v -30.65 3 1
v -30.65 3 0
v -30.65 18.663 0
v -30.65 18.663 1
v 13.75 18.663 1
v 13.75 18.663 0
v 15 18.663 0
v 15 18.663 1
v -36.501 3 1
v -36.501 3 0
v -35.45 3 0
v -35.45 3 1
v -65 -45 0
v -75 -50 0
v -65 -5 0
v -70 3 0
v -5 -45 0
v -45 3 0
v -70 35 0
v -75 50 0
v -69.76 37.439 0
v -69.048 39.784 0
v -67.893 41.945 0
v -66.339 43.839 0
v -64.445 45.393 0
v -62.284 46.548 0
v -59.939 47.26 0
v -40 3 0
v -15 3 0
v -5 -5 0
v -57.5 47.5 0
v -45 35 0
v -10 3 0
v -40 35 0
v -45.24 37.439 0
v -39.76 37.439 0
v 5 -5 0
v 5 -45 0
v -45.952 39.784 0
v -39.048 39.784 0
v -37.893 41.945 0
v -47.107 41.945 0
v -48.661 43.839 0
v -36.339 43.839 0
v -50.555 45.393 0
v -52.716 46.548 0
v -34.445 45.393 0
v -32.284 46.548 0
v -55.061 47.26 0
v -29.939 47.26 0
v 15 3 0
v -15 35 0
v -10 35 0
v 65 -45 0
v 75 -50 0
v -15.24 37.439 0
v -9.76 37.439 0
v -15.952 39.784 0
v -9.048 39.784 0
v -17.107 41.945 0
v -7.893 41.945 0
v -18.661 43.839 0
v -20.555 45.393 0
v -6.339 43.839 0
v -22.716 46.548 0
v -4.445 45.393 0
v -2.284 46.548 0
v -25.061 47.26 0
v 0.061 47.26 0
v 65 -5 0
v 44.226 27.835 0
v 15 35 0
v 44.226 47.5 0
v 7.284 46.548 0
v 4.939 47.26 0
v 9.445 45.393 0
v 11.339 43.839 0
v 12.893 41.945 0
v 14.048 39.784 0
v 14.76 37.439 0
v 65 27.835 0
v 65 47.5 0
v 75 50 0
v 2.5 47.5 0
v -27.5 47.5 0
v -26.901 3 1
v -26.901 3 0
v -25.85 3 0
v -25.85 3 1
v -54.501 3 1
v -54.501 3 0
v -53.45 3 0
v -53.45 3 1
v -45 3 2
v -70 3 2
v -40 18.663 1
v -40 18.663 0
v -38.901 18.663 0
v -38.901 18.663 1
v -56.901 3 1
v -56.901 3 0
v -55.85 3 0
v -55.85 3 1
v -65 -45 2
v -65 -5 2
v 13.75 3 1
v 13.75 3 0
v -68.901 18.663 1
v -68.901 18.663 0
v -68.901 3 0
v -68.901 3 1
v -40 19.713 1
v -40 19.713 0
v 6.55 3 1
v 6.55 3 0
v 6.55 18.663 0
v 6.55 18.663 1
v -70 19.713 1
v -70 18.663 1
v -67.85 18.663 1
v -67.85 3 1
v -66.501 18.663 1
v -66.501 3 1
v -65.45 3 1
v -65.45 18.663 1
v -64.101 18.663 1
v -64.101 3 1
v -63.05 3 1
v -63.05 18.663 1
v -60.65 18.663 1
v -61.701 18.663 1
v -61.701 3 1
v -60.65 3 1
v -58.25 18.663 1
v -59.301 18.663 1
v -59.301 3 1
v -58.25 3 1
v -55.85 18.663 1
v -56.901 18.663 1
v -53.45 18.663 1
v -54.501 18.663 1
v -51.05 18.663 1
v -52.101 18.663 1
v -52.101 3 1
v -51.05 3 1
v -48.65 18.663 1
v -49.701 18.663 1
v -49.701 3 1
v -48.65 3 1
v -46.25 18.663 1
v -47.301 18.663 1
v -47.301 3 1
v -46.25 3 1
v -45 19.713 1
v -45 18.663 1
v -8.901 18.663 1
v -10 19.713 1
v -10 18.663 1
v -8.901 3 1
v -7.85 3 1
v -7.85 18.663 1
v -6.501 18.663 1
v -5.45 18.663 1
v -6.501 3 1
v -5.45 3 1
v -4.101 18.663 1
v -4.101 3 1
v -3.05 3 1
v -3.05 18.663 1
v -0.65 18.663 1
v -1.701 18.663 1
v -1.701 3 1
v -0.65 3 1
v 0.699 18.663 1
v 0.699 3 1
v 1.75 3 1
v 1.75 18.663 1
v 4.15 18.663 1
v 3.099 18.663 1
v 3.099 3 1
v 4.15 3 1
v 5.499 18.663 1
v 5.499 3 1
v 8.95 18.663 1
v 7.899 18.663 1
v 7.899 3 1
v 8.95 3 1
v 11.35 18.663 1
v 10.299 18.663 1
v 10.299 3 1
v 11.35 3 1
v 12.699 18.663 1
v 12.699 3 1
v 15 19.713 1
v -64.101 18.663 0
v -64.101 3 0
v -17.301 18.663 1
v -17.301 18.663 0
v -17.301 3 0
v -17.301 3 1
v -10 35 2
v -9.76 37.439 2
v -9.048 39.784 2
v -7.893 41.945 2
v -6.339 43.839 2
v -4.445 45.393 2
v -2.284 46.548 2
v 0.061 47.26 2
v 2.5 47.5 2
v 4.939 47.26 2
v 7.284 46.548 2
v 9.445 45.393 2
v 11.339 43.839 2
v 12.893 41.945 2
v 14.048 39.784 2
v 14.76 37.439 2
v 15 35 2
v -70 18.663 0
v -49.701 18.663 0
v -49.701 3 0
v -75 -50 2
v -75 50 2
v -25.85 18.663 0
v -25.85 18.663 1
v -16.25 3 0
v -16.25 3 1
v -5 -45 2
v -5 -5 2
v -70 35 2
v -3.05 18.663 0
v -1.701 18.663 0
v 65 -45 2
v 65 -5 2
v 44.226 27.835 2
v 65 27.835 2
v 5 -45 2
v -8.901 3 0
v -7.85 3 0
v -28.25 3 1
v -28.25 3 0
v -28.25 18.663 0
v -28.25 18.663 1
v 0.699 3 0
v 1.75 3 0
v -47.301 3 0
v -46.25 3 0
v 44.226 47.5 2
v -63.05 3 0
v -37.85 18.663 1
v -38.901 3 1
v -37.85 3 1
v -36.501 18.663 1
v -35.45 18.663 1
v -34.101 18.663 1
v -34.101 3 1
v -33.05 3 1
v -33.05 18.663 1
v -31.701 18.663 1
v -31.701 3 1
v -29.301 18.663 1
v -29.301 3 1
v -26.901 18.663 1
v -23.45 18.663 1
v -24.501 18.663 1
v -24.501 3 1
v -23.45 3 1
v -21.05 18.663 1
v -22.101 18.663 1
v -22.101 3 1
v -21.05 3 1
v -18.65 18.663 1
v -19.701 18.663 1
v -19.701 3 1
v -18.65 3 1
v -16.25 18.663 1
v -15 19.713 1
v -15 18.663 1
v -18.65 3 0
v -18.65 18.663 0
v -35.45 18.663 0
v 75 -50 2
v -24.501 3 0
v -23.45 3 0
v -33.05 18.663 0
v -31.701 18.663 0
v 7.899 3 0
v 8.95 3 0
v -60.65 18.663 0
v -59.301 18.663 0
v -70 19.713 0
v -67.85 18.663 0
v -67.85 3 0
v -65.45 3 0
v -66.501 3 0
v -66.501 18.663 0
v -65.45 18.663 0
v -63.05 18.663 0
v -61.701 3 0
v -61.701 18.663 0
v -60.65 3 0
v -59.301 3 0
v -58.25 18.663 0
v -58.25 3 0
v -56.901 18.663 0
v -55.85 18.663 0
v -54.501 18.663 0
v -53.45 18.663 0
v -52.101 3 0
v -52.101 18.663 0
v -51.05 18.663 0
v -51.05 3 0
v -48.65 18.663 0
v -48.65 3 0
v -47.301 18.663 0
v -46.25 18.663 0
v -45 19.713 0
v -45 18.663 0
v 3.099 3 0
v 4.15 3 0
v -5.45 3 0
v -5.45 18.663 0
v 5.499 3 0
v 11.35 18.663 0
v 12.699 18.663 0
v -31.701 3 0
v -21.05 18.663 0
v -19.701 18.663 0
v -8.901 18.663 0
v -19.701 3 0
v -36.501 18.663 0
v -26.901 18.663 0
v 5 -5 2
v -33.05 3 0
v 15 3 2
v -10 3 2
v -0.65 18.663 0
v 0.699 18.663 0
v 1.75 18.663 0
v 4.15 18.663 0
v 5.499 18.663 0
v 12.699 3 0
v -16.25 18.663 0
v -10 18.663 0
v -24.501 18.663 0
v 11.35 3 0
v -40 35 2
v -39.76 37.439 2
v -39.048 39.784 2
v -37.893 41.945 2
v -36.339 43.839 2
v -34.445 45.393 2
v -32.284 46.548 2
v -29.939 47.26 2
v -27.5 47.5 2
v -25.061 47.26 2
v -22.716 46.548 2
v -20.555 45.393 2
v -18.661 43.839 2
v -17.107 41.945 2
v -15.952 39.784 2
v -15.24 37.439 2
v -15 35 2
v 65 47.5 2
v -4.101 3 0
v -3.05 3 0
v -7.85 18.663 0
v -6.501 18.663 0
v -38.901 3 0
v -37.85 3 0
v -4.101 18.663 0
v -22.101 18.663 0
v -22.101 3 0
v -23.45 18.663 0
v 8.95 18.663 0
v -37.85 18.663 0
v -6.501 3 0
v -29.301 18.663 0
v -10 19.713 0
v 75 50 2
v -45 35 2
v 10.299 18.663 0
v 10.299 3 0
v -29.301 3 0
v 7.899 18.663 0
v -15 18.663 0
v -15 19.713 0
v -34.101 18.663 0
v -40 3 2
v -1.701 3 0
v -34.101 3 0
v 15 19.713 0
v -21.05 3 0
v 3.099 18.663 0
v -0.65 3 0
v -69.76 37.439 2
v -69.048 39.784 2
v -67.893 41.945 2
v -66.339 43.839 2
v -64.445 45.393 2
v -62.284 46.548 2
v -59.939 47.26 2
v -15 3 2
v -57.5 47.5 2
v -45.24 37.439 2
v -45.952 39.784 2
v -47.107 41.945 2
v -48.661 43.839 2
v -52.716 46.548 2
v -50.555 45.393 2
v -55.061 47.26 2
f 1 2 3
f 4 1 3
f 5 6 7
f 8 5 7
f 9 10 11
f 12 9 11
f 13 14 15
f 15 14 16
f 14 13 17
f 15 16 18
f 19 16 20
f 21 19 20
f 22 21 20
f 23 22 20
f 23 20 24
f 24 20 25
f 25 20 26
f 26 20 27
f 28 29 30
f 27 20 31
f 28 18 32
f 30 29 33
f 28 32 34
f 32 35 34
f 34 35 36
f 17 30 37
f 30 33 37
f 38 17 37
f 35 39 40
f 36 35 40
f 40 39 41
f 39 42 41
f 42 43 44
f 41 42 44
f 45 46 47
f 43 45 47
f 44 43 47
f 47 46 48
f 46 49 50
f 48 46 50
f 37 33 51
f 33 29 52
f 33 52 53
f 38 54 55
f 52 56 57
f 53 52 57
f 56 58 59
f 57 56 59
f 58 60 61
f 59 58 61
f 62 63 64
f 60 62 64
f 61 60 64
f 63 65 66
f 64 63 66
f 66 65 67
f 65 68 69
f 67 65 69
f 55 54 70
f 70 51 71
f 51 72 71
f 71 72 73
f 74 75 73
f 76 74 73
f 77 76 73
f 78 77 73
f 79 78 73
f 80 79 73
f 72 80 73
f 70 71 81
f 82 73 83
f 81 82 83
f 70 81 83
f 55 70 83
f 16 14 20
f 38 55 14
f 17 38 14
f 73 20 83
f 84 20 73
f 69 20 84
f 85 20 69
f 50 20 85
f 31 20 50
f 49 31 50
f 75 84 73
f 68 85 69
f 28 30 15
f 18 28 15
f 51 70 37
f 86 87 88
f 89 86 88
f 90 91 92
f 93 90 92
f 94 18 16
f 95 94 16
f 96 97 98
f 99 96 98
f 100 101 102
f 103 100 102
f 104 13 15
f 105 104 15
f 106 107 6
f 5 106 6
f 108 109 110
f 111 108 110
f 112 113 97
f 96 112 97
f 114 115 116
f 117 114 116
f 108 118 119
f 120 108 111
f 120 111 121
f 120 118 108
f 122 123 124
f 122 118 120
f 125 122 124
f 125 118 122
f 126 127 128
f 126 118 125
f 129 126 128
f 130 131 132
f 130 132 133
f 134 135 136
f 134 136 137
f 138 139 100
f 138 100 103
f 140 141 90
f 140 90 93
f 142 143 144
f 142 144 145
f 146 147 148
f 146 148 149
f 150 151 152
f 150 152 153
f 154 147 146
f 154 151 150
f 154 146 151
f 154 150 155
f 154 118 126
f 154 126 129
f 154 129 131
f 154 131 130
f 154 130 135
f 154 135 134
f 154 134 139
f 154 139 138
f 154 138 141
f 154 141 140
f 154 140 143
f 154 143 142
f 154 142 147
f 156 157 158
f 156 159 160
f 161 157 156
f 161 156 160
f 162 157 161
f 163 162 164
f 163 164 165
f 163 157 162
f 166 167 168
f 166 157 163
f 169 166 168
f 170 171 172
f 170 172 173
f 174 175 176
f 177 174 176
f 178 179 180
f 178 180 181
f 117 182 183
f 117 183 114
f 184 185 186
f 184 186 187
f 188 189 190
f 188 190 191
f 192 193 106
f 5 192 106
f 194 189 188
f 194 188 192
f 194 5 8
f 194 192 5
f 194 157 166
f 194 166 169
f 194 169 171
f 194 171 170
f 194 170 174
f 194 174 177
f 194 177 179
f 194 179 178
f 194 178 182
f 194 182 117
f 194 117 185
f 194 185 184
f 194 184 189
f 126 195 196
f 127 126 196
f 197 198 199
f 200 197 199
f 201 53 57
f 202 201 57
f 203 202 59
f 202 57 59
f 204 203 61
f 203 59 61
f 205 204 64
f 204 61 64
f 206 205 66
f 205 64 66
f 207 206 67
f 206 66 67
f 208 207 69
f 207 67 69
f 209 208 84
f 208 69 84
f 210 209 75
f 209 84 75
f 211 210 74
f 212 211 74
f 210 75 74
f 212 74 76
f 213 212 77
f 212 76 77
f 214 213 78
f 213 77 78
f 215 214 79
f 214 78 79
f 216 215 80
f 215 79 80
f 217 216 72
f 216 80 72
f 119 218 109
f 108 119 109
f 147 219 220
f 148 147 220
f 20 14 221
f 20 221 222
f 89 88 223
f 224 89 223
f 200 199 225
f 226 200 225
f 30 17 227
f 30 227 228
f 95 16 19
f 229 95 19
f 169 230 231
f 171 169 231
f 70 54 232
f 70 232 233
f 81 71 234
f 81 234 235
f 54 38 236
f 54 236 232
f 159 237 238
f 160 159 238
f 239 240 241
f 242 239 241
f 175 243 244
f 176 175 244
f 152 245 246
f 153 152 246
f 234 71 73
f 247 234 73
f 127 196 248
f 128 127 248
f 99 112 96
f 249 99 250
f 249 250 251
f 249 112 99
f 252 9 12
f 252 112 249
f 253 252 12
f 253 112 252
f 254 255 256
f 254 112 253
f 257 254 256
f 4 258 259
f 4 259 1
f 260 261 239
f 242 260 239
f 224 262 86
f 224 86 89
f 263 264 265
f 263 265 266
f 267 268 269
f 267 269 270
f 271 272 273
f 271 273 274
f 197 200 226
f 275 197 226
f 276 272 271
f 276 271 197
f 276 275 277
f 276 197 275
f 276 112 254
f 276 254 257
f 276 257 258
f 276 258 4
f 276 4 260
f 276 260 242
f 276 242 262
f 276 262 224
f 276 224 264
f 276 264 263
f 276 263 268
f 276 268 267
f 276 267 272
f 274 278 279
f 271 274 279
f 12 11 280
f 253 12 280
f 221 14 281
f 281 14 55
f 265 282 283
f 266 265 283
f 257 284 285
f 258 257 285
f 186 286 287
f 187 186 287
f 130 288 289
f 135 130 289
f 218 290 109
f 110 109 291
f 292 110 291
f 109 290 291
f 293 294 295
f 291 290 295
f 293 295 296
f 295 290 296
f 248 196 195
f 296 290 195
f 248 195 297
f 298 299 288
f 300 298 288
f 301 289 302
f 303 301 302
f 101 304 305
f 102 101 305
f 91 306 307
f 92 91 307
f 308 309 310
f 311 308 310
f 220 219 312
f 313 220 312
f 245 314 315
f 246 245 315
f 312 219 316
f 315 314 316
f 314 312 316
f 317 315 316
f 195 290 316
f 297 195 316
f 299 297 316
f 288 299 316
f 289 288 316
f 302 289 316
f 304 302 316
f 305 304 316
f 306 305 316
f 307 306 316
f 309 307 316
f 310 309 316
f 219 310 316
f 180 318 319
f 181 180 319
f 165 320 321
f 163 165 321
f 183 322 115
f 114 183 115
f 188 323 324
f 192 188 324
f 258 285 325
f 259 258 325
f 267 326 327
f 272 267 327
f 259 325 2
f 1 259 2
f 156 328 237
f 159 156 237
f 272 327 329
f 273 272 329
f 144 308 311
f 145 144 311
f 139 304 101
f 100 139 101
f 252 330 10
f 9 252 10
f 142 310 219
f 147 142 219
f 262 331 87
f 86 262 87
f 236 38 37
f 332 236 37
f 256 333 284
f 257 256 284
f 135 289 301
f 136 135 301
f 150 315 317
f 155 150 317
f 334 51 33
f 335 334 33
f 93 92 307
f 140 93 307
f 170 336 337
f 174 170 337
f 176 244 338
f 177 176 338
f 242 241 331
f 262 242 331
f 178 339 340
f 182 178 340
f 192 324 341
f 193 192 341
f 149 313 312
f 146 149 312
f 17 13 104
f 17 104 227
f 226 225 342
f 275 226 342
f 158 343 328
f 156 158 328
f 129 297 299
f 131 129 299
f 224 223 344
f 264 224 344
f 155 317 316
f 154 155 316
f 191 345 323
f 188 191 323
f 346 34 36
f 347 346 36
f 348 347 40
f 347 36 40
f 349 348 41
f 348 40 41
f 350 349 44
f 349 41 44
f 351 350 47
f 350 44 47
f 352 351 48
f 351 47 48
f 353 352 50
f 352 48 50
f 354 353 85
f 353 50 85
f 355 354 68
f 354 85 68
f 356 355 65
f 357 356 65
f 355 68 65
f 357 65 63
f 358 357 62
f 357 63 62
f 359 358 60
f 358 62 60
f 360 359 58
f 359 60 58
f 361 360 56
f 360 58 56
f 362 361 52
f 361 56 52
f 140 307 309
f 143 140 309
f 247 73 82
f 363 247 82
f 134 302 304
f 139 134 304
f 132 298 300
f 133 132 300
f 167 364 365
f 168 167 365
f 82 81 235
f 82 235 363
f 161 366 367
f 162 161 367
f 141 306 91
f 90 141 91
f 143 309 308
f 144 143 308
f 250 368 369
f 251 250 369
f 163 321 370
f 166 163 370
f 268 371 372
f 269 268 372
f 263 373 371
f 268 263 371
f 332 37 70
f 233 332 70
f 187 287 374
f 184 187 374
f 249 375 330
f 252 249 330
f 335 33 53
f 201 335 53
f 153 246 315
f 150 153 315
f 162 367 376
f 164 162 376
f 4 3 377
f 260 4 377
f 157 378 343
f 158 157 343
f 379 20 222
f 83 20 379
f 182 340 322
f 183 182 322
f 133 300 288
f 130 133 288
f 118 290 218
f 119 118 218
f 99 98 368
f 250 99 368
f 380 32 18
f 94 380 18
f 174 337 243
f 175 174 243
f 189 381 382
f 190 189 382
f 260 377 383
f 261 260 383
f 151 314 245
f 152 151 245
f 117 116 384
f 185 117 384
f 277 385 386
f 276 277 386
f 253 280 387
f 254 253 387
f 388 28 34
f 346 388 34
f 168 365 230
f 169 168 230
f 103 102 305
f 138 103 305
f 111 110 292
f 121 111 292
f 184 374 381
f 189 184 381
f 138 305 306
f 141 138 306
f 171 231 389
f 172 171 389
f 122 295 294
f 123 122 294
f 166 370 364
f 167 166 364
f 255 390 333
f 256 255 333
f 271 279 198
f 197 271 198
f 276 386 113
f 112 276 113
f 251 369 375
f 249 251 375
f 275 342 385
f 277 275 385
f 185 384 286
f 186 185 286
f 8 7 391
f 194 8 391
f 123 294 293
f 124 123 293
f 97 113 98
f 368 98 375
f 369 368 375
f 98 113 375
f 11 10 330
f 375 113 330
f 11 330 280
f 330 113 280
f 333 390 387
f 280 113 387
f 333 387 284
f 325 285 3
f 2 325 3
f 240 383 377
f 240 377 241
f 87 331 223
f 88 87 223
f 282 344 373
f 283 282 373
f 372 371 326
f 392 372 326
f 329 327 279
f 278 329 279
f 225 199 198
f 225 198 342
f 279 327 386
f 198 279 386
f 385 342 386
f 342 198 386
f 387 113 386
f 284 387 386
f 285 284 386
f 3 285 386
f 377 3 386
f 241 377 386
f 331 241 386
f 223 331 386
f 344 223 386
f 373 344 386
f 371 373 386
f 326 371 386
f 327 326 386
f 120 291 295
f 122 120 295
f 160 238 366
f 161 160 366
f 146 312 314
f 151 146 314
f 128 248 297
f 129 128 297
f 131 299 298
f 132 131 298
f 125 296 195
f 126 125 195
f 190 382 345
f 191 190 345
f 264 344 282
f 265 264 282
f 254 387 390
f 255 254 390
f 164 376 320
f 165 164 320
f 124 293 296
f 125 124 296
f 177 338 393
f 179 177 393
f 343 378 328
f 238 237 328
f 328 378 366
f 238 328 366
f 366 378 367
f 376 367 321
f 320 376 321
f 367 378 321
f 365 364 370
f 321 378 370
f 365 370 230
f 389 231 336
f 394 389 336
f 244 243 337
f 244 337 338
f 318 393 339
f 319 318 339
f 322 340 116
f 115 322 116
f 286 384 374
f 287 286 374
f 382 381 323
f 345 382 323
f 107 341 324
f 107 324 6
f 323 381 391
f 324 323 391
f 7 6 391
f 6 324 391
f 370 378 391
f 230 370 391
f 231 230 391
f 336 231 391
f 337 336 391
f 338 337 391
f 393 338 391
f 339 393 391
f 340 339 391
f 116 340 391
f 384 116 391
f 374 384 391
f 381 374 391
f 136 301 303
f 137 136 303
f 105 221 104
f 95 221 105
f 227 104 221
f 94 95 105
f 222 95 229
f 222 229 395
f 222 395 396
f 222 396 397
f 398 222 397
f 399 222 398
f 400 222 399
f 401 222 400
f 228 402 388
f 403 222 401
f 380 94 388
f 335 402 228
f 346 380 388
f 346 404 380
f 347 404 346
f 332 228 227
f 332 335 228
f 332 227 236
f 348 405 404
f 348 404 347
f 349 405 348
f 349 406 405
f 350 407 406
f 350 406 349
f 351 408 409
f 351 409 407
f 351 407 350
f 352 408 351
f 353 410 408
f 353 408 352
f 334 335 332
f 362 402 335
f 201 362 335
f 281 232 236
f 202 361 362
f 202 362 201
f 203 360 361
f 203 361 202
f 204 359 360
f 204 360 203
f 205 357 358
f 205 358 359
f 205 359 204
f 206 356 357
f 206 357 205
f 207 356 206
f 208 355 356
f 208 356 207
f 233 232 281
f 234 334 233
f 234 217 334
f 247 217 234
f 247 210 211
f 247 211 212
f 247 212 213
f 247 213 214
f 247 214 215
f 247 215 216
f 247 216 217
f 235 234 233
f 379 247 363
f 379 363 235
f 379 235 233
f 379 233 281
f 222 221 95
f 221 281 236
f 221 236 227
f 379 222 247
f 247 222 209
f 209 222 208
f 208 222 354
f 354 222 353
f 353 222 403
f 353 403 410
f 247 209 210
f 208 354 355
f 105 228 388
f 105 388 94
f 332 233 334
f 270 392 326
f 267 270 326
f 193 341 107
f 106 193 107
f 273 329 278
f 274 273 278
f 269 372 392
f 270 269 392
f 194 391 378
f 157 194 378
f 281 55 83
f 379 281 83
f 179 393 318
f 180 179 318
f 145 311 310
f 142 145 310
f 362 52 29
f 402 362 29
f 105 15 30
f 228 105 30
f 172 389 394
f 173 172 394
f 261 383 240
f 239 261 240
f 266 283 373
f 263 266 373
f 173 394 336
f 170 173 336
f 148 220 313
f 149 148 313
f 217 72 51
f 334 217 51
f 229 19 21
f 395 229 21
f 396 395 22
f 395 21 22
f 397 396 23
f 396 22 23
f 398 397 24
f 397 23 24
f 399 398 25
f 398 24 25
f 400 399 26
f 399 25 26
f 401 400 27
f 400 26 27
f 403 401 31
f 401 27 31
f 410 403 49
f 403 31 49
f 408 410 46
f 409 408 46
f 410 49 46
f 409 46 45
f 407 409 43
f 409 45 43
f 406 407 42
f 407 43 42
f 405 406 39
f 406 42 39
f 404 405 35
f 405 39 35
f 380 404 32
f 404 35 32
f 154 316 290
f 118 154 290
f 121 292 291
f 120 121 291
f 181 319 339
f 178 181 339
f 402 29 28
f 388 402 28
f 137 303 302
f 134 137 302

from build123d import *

# Parameters (mm, degrees)
F1_DEPTH = 1
F0_W     = 150
F0_H     = 100
F0_W_2   = 60
F0_H_2   = 40
F0_W_3   = 20.773581
F0_H_3   = 19.665093
F2_DEPTH = 2


with BuildPart() as f1:
    # F0 (on Top) → F1 (new body)
    with BuildSketch(Plane.XY):
        Polygon((-30.650433, 3), (-30.650433, 18.662618), (-29.301084, 18.662618), (-29.301084, 3), (-28.250433, 3), (-28.250433, 18.662618), (-26.901084, 18.662618), (-26.901084, 3), (-25.850433, 3), (-25.850433, 18.662618), (-24.501084, 18.662618), (-24.501084, 3), (-23.450433, 3), (-23.450433, 18.662618), (-22.101084, 18.662618), (-22.101084, 3), (-21.050433, 3), (-21.050433, 18.662618), (-19.701084, 18.662618), (-19.701084, 3), (-18.650433, 3), (-18.650433, 18.662618), (-17.301084, 18.662618), (-17.301084, 3), (-16.250433, 3), (-16.250433, 18.662618), (-15, 18.662618), (-15, 19.713273), (-40, 19.713273), (-40, 18.662618), (-38.901084, 18.662618), (-38.901084, 3), (-37.850433, 3), (-37.850433, 18.662618), (-36.501084, 18.662618), (-36.501084, 3), (-35.450433, 3), (-35.450433, 18.662618), (-34.101084, 18.662618), (-34.101084, 3), (-33.050433, 3), (-33.050433, 18.662618), (-31.701084, 18.662618), (-31.701084, 3), align=None)
        Polygon((-0.650433, 3), (-0.650433, 18.662618), (0.698916, 18.662618), (0.698916, 3), (1.749567, 3), (1.749567, 18.662618), (3.098916, 18.662618), (3.098916, 3), (4.149567, 3), (4.149567, 18.662618), (5.498916, 18.662618), (5.498916, 3), (6.549567, 3), (6.549567, 18.662618), (7.898916, 18.662618), (7.898916, 3), (8.949567, 3), (8.949567, 18.662618), (10.298916, 18.662618), (10.298916, 3), (11.349567, 3), (11.349567, 18.662618), (12.698916, 18.662618), (12.698916, 3), (13.749567, 3), (13.749567, 18.662618), (15, 18.662618), (15, 19.713273), (-10, 19.713273), (-10, 18.662618), (-8.901084, 18.662618), (-8.901084, 3), (-7.850433, 3), (-7.850433, 18.662618), (-6.501084, 18.662618), (-6.501084, 3), (-5.450433, 3), (-5.450433, 18.662618), (-4.101084, 18.662618), (-4.101084, 3), (-3.050433, 3), (-3.050433, 18.662618), (-1.701084, 18.662618), (-1.701084, 3), align=None)
        Polygon((-45, 18.662618), (-45, 19.713273), (-70, 19.713273), (-70, 18.662618), (-68.901084, 18.662618), (-68.901084, 3), (-67.850433, 3), (-67.850433, 18.662618), (-66.501084, 18.662618), (-66.501084, 3), (-65.450433, 3), (-65.450433, 18.662618), (-64.101084, 18.662618), (-64.101084, 3), (-63.050433, 3), (-63.050433, 18.662618), (-61.701084, 18.662618), (-61.701084, 3), (-60.650433, 3), (-60.650433, 18.662618), (-59.301084, 18.662618), (-59.301084, 3), (-58.250433, 3), (-58.250433, 18.662618), (-56.901084, 18.662618), (-56.901084, 3), (-55.850433, 3), (-55.850433, 18.662618), (-54.501084, 18.662618), (-54.501084, 3), (-53.450433, 3), (-53.450433, 18.662618), (-52.101084, 18.662618), (-52.101084, 3), (-51.050433, 3), (-51.050433, 18.662618), (-49.701084, 18.662618), (-49.701084, 3), (-48.650433, 3), (-48.650433, 18.662618), (-47.301084, 18.662618), (-47.301084, 3), (-46.250433, 3), (-46.250433, 18.662618), align=None)
    extrude(amount=F1_DEPTH)


with BuildPart() as f2:
    # F0 (on Top) → F2 (new body)
    with BuildSketch(Plane.XY):
        Rectangle(F0_W, F0_H)
        with Locations((-35, -25)):
            Rectangle(F0_W_2, F0_H_2, mode=Mode.SUBTRACT)
        with Locations((35, -25)):
            Rectangle(F0_W_2, F0_H_2, mode=Mode.SUBTRACT)
        with BuildLine():
            ThreePointArc((-70, 35), (-57.5, 47.5), (-45, 35))
            Line((-45, 35), (-45, 19.713273))
            Line((-45, 19.713273), (-45, 18.662618))
            Line((-45, 18.662618), (-45, 3))
            Line((-45, 3), (-46.250433, 3))
            Line((-46.250433, 3), (-47.301084, 3))
            Line((-47.301084, 3), (-48.650433, 3))
            Line((-48.650433, 3), (-49.701084, 3))
            Line((-49.701084, 3), (-51.050433, 3))
            Line((-51.050433, 3), (-52.101084, 3))
            Line((-52.101084, 3), (-53.450433, 3))
            Line((-53.450433, 3), (-54.501084, 3))
            Line((-54.501084, 3), (-55.850433, 3))
            Line((-55.850433, 3), (-56.901084, 3))
            Line((-56.901084, 3), (-58.250433, 3))
            Line((-58.250433, 3), (-59.301084, 3))
            Line((-59.301084, 3), (-60.650433, 3))
            Line((-60.650433, 3), (-61.701084, 3))
            Line((-61.701084, 3), (-63.050433, 3))
            Line((-63.050433, 3), (-64.101084, 3))
            Line((-64.101084, 3), (-65.450433, 3))
            Line((-65.450433, 3), (-66.501084, 3))
            Line((-66.501084, 3), (-67.850433, 3))
            Line((-67.850433, 3), (-68.901084, 3))
            Line((-68.901084, 3), (-70, 3))
            Line((-70, 3), (-70, 18.662618))
            Line((-70, 18.662618), (-70, 19.713273))
            Line((-70, 19.713273), (-70, 35))
        make_face(mode=Mode.SUBTRACT)
        with BuildLine():
            Line((-29.301084, 3), (-30.650433, 3))
            Line((-30.650433, 3), (-31.701084, 3))
            Line((-31.701084, 3), (-33.050433, 3))
            Line((-33.050433, 3), (-34.101084, 3))
            Line((-34.101084, 3), (-35.450433, 3))
            Line((-35.450433, 3), (-36.501084, 3))
            Line((-36.501084, 3), (-37.850433, 3))
            Line((-37.850433, 3), (-38.901084, 3))
            Line((-38.901084, 3), (-40, 3))
            Line((-40, 3), (-40, 18.662618))
            Line((-40, 18.662618), (-40, 19.713273))
            Line((-40, 19.713273), (-40, 35))
            ThreePointArc((-40, 35), (-27.5, 47.5), (-15, 35))
            Line((-15, 35), (-15, 19.713273))
            Line((-15, 19.713273), (-15, 18.662618))
            Line((-15, 18.662618), (-15, 3))
            Line((-15, 3), (-16.250433, 3))
            Line((-16.250433, 3), (-17.301084, 3))
            Line((-17.301084, 3), (-18.650433, 3))
            Line((-18.650433, 3), (-19.701084, 3))
            Line((-19.701084, 3), (-21.050433, 3))
            Line((-21.050433, 3), (-22.101084, 3))
            Line((-22.101084, 3), (-23.450433, 3))
            Line((-23.450433, 3), (-24.501084, 3))
            Line((-24.501084, 3), (-25.850433, 3))
            Line((-25.850433, 3), (-26.901084, 3))
            Line((-26.901084, 3), (-28.250433, 3))
            Line((-28.250433, 3), (-29.301084, 3))
        make_face(mode=Mode.SUBTRACT)
        with BuildLine():
            Line((0.698916, 3), (-0.650433, 3))
            Line((-0.650433, 3), (-1.701084, 3))
            Line((-1.701084, 3), (-3.050433, 3))
            Line((-3.050433, 3), (-4.101084, 3))
            Line((-4.101084, 3), (-5.450433, 3))
            Line((-5.450433, 3), (-6.501084, 3))
            Line((-6.501084, 3), (-7.850433, 3))
            Line((-7.850433, 3), (-8.901084, 3))
            Line((-8.901084, 3), (-10, 3))
            Line((-10, 3), (-10, 18.662618))
            Line((-10, 18.662618), (-10, 19.713273))
            Line((-10, 19.713273), (-10, 35))
            ThreePointArc((-10, 35), (2.5, 47.5), (15, 35))
            Line((15, 35), (15, 19.713273))
            Line((15, 19.713273), (15, 18.662618))
            Line((15, 18.662618), (15, 3))
            Line((15, 3), (13.749567, 3))
            Line((13.749567, 3), (12.698916, 3))
            Line((12.698916, 3), (11.349567, 3))
            Line((11.349567, 3), (10.298916, 3))
            Line((10.298916, 3), (8.949567, 3))
            Line((8.949567, 3), (7.898916, 3))
            Line((7.898916, 3), (6.549567, 3))
            Line((6.549567, 3), (5.498916, 3))
            Line((5.498916, 3), (4.149567, 3))
            Line((4.149567, 3), (3.098916, 3))
            Line((3.098916, 3), (1.749567, 3))
            Line((1.749567, 3), (0.698916, 3))
        make_face(mode=Mode.SUBTRACT)
        with Locations((54.613209, 37.667454)):
            Rectangle(F0_W_3, F0_H_3, mode=Mode.SUBTRACT)
    extrude(amount=F2_DEPTH)


solid = Compound([f1.part, f2.part])
